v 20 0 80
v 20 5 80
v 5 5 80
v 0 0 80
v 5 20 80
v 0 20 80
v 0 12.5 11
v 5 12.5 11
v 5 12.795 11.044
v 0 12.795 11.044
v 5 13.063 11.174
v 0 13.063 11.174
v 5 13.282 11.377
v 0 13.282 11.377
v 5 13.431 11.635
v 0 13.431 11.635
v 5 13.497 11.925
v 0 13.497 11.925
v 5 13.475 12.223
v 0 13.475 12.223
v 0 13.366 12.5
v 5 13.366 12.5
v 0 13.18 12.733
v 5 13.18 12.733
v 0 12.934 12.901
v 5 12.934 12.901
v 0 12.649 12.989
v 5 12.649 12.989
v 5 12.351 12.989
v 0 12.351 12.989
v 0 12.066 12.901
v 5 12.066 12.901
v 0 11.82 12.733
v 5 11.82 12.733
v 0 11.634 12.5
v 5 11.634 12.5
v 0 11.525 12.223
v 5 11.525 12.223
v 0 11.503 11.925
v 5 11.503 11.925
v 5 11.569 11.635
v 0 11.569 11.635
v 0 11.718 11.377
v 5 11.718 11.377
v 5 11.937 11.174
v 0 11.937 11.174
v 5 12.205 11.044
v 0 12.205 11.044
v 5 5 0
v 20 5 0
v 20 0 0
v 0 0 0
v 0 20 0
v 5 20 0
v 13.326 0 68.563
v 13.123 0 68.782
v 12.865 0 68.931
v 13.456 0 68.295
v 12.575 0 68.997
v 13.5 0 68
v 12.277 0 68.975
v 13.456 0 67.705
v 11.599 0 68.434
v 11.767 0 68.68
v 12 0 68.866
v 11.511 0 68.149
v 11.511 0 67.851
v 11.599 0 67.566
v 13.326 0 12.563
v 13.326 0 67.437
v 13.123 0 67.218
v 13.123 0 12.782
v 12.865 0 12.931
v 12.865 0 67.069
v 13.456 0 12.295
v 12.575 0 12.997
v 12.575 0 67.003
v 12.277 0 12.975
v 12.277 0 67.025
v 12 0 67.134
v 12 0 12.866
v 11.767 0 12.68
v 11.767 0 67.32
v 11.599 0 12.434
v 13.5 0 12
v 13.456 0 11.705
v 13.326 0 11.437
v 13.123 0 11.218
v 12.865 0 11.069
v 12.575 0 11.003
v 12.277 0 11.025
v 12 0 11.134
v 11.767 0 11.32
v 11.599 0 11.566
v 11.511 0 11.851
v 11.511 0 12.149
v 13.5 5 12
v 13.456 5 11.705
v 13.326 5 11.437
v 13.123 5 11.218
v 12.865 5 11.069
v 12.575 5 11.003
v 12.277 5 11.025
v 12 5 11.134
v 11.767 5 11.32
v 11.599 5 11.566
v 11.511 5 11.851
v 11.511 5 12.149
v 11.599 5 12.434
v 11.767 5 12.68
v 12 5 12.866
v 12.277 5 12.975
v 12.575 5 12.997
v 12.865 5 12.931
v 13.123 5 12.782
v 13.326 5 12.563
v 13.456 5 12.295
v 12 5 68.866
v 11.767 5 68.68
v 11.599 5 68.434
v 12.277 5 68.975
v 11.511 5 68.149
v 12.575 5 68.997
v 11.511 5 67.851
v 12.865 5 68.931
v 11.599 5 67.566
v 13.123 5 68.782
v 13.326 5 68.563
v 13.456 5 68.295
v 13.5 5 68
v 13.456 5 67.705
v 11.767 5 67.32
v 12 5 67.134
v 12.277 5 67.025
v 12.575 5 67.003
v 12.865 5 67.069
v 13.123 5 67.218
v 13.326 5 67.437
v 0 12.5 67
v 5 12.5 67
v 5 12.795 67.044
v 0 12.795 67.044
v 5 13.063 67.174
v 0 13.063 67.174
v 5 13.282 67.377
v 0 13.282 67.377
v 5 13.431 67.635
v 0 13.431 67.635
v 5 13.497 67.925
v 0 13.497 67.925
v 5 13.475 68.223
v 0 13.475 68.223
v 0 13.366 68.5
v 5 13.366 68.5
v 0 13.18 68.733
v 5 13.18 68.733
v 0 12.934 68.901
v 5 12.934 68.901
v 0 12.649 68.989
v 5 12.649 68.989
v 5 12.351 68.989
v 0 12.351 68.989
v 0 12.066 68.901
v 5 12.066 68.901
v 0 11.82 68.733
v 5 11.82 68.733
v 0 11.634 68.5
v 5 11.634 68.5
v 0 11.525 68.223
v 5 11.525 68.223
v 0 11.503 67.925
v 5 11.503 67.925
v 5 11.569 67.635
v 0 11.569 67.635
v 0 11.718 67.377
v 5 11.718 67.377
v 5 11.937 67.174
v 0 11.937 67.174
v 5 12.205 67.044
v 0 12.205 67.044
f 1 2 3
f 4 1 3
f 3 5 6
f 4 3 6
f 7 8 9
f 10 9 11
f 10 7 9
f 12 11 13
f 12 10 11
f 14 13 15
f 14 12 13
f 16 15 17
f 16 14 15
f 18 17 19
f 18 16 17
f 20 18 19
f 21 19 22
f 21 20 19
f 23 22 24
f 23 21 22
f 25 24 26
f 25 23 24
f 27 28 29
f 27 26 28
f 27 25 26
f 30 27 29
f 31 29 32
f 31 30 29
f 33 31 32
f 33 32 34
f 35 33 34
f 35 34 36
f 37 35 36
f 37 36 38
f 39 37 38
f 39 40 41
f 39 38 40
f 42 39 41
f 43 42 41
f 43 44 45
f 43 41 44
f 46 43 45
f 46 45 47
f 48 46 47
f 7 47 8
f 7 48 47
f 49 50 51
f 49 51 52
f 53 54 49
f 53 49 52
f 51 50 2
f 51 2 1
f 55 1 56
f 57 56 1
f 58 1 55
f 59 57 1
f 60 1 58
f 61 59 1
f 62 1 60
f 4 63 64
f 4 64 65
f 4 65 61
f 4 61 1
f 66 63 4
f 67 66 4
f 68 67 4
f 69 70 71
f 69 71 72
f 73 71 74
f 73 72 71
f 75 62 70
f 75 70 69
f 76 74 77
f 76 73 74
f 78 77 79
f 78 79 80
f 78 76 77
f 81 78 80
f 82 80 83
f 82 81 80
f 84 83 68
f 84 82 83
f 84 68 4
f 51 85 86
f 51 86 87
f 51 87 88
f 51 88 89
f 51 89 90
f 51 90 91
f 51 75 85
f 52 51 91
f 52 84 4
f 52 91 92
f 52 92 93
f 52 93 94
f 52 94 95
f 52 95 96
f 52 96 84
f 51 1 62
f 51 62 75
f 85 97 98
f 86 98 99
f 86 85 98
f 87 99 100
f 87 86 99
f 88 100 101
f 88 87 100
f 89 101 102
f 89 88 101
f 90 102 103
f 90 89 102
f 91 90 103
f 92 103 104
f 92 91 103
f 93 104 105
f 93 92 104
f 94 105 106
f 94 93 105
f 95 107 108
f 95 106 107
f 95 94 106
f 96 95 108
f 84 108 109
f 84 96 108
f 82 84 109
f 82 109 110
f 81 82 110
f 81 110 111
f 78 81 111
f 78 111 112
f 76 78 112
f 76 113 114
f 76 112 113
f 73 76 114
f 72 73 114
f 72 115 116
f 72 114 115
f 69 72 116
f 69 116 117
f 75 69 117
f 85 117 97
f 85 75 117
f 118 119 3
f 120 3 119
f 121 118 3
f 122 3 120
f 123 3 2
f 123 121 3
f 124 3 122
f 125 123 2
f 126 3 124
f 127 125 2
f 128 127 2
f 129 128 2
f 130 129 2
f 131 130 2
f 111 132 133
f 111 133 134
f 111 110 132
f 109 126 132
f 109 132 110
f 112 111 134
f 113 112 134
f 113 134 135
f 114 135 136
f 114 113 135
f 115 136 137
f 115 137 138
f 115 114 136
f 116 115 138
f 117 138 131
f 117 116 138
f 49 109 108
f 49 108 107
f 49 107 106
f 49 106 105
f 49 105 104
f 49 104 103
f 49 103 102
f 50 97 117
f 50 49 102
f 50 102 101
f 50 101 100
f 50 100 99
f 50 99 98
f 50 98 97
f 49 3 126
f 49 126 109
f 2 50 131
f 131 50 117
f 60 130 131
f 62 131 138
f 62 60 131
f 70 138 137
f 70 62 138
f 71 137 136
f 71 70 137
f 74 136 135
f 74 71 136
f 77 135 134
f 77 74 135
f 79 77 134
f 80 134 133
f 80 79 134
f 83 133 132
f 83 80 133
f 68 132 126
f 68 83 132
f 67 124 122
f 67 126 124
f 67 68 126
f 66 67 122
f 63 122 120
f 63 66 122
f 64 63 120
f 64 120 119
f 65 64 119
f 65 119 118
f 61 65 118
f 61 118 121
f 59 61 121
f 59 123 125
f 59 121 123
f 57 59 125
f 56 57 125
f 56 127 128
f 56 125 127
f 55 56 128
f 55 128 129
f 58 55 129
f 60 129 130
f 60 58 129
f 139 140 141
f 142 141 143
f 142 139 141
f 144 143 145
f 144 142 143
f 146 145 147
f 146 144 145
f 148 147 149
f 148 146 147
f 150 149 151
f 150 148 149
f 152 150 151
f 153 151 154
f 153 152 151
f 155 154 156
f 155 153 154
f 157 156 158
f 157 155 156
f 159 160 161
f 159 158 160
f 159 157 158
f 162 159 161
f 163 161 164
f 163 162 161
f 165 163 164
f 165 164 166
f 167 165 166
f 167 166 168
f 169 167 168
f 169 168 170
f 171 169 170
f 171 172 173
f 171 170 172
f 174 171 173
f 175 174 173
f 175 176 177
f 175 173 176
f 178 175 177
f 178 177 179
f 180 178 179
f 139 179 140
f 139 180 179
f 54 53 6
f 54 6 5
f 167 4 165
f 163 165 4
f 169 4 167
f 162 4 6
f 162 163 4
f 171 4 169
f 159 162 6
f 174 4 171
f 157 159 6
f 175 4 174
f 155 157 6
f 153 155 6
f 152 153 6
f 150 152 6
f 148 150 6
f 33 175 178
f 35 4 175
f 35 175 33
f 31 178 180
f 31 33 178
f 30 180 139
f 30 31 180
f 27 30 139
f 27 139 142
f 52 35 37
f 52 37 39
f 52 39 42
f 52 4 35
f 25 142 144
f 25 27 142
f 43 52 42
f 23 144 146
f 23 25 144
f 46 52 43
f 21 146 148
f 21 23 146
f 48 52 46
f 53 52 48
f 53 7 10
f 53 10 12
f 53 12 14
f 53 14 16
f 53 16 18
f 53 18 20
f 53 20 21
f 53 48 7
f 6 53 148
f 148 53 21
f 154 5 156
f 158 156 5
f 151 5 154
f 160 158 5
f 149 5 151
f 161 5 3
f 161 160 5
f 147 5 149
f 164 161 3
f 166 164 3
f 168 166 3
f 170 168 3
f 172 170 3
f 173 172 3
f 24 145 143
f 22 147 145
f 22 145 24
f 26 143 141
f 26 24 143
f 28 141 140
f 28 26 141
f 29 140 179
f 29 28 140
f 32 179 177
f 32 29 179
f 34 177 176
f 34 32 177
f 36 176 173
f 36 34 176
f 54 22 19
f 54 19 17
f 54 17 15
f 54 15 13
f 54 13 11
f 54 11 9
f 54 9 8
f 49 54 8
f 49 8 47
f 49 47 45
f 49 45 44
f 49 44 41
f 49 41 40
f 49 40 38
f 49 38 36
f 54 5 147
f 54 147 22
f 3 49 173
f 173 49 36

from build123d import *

# Parameters (mm, degrees)
EXTRUDE_1_DEPTH          = 80
SKETCH_2_R               = 1
CUT_EXTRUDE_2_DEPTH      = 10
CUT_EXTRUDE_2_DEPTH_BACK = 10
SKETCH_3_R               = 1
CUT_EXTRUDE_3_DEPTH      = 10
CUT_EXTRUDE_3_DEPTH_BACK = 10


with BuildPart() as part:
    # 草圖1 → 填料-伸長1 (new body)
    with BuildSketch(Plane.XY):
        Polygon((0, 0), (0, 20), (5, 20), (5, 5), (20, 5), (20, 0), align=None)
    extrude(amount=EXTRUDE_1_DEPTH)

    # 草圖2 → 除料-伸長2 (cut, two sides)
    with BuildSketch(Plane(origin=(0, 0, 0), x_dir=(1, 0, 0), z_dir=(0, 1, 0))) as cut_extrude_2_sk:
        with Locations((12.5, -12)):
            Circle(SKETCH_2_R)
        with Locations((12.5, -68)):
            Circle(SKETCH_2_R)
    extrude(amount=CUT_EXTRUDE_2_DEPTH, mode=Mode.SUBTRACT)
    extrude(cut_extrude_2_sk.sketch, amount=-CUT_EXTRUDE_2_DEPTH_BACK, mode=Mode.SUBTRACT)

    # 草圖3 → 除料-伸長3 (cut, two sides)
    with BuildSketch(Plane(origin=(0, 0, 0), x_dir=(0, 0, -1), z_dir=(1, 0, 0))) as cut_extrude_3_sk:
        with Locations((-12, 12.5)):
            Circle(SKETCH_3_R)
        with Locations((-68, 12.5)):
            Circle(SKETCH_3_R)
    extrude(amount=CUT_EXTRUDE_3_DEPTH, mode=Mode.SUBTRACT)
    extrude(cut_extrude_3_sk.sketch, amount=-CUT_EXTRUDE_3_DEPTH_BACK, mode=Mode.SUBTRACT)


solid = part.part
